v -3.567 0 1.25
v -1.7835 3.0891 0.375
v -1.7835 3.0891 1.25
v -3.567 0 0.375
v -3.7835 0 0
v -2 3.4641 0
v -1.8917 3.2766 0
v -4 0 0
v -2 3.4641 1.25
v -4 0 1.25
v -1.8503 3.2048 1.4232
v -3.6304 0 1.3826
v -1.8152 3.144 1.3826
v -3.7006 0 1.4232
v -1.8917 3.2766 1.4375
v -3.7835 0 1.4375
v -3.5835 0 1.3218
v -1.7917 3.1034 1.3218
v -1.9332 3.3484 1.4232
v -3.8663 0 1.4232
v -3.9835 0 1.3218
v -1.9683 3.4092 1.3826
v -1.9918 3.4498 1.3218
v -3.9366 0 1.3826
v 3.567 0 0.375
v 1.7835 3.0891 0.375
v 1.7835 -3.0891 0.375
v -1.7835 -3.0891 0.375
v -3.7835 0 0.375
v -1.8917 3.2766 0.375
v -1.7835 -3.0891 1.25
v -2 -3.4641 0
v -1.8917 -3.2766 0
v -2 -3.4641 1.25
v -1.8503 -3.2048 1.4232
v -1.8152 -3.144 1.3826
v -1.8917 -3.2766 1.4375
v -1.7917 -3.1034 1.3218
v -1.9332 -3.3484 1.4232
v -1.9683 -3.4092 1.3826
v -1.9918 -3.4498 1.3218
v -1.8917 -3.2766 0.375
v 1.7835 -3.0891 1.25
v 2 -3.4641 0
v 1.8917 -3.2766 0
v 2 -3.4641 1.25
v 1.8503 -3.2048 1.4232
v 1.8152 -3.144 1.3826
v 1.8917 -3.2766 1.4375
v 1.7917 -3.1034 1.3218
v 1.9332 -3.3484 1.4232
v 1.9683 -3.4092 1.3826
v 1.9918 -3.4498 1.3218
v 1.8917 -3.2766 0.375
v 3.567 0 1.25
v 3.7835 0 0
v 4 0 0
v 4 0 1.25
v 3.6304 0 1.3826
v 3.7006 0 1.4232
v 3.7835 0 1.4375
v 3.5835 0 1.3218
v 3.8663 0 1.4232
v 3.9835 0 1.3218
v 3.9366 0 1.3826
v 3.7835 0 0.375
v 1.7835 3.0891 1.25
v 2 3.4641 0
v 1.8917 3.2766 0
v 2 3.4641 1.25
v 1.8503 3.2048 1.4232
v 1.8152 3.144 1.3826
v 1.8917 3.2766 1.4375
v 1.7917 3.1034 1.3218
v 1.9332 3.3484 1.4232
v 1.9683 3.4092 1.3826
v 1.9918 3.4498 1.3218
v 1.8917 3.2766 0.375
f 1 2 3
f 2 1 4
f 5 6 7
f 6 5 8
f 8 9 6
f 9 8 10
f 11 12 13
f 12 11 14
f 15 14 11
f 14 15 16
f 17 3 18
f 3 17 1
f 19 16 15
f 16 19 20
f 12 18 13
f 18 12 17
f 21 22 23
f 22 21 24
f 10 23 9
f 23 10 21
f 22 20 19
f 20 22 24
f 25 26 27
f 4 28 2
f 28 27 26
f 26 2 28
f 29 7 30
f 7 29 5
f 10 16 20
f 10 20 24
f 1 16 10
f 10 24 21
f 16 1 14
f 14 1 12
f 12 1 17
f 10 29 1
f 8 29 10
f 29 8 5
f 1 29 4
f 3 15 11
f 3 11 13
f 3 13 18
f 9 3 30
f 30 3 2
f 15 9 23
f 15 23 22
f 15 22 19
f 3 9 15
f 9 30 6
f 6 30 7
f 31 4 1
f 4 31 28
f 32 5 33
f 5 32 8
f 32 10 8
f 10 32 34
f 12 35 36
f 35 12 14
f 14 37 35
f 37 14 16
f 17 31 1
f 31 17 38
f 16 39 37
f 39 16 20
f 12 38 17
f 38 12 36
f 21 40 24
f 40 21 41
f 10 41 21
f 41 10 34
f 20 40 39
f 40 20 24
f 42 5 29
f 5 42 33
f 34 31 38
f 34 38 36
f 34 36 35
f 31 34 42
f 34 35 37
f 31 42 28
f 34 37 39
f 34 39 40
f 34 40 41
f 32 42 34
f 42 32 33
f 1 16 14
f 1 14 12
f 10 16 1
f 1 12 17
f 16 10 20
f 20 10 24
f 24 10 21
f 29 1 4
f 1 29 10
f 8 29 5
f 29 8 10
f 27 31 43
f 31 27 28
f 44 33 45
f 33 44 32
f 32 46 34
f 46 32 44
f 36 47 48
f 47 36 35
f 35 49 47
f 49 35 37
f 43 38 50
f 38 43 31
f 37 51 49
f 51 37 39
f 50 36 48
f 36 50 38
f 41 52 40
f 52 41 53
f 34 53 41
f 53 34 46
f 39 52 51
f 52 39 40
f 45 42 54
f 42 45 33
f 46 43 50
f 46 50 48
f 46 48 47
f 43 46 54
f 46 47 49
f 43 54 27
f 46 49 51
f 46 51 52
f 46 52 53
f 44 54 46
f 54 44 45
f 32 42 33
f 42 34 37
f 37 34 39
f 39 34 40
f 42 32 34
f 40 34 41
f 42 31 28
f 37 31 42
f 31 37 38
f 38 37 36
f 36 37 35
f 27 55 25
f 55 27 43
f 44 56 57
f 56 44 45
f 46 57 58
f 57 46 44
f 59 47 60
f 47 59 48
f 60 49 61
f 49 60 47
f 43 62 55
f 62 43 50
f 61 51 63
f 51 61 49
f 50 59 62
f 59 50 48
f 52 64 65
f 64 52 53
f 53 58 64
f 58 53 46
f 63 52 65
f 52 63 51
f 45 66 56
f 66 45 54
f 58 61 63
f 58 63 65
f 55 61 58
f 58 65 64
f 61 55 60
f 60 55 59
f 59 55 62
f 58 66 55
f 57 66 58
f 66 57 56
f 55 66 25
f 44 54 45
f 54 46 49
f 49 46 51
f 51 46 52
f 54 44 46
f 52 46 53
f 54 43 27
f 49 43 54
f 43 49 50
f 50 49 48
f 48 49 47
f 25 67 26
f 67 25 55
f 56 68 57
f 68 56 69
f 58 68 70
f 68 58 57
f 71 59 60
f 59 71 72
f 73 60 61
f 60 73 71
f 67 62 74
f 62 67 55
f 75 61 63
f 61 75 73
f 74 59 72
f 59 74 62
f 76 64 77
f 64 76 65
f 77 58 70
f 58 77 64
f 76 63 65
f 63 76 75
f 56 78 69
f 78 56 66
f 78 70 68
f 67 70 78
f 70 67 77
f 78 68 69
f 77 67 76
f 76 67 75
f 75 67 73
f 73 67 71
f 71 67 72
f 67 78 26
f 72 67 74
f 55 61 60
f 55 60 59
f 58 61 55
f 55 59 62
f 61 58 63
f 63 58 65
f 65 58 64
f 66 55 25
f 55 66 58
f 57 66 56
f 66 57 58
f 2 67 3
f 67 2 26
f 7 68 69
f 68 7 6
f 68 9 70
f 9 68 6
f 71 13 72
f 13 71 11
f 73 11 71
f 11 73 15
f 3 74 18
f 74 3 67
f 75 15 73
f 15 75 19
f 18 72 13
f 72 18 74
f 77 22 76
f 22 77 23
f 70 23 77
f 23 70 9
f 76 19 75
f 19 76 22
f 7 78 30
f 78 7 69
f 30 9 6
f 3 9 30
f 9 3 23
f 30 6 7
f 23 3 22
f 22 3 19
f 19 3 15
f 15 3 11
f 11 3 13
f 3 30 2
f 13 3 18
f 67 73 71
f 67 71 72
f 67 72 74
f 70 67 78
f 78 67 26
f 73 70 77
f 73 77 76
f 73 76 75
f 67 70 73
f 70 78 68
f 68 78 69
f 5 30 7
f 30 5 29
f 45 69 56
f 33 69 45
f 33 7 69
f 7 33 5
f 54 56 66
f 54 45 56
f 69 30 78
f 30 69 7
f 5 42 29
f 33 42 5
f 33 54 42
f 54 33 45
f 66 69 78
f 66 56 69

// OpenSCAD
phi = (1 + sqrt(5))/2;
base_thickness = 3/8;
base_size = 4; // 4 / sin(60);

thickness = 3/8; // 1/2;
golden_height = phi * base_size /4;
height = round(golden_height * 8) / 8; // 1 + 3/4;
echo(height);

module base()
{
    base_edge = base_size - thickness / cos(30) / 2;
    pts = [for (angle = [0:5]) 
        [base_edge * cos(60 * angle), base_edge * sin(60 * angle)]
    ];
    
    linear_extrude(base_thickness)
        polygon(pts);
}

module side()
{
    intersection()
    {
        //rotate([0, 0, -30])
        translate([-base_size, 0, 0])
        rotate([0, 0, 330])
        translate([0, -base_size/2, 0])
        difference()
        {
            union()
            {
                cube([thickness, base_size *2, height - thickness], center = false);
                translate([thickness/2, 0, height - thickness])
                rotate([-90, 0, 0])
                cylinder(h = base_size * 2, r = thickness / 2, $fn = 16);
            }
            
            translate([thickness/2, -0.1, -0.1])
            cube([thickness + 0.1, base_size *2 + 0.2, base_thickness + 0.1], center = false);
        }
        
        // triangle cut-out.
        pts = [[0, 0], [-base_size * 2, 0], [-base_size * 2 * cos(60), base_size * 2 * sin(60)]];
        translate([0, 0, -0.1])
        linear_extrude(height + 0.2)
            polygon(pts);
    }
}

for (angle = [0:5])
    rotate([0, 0, 60 * angle])
        side();
base();
